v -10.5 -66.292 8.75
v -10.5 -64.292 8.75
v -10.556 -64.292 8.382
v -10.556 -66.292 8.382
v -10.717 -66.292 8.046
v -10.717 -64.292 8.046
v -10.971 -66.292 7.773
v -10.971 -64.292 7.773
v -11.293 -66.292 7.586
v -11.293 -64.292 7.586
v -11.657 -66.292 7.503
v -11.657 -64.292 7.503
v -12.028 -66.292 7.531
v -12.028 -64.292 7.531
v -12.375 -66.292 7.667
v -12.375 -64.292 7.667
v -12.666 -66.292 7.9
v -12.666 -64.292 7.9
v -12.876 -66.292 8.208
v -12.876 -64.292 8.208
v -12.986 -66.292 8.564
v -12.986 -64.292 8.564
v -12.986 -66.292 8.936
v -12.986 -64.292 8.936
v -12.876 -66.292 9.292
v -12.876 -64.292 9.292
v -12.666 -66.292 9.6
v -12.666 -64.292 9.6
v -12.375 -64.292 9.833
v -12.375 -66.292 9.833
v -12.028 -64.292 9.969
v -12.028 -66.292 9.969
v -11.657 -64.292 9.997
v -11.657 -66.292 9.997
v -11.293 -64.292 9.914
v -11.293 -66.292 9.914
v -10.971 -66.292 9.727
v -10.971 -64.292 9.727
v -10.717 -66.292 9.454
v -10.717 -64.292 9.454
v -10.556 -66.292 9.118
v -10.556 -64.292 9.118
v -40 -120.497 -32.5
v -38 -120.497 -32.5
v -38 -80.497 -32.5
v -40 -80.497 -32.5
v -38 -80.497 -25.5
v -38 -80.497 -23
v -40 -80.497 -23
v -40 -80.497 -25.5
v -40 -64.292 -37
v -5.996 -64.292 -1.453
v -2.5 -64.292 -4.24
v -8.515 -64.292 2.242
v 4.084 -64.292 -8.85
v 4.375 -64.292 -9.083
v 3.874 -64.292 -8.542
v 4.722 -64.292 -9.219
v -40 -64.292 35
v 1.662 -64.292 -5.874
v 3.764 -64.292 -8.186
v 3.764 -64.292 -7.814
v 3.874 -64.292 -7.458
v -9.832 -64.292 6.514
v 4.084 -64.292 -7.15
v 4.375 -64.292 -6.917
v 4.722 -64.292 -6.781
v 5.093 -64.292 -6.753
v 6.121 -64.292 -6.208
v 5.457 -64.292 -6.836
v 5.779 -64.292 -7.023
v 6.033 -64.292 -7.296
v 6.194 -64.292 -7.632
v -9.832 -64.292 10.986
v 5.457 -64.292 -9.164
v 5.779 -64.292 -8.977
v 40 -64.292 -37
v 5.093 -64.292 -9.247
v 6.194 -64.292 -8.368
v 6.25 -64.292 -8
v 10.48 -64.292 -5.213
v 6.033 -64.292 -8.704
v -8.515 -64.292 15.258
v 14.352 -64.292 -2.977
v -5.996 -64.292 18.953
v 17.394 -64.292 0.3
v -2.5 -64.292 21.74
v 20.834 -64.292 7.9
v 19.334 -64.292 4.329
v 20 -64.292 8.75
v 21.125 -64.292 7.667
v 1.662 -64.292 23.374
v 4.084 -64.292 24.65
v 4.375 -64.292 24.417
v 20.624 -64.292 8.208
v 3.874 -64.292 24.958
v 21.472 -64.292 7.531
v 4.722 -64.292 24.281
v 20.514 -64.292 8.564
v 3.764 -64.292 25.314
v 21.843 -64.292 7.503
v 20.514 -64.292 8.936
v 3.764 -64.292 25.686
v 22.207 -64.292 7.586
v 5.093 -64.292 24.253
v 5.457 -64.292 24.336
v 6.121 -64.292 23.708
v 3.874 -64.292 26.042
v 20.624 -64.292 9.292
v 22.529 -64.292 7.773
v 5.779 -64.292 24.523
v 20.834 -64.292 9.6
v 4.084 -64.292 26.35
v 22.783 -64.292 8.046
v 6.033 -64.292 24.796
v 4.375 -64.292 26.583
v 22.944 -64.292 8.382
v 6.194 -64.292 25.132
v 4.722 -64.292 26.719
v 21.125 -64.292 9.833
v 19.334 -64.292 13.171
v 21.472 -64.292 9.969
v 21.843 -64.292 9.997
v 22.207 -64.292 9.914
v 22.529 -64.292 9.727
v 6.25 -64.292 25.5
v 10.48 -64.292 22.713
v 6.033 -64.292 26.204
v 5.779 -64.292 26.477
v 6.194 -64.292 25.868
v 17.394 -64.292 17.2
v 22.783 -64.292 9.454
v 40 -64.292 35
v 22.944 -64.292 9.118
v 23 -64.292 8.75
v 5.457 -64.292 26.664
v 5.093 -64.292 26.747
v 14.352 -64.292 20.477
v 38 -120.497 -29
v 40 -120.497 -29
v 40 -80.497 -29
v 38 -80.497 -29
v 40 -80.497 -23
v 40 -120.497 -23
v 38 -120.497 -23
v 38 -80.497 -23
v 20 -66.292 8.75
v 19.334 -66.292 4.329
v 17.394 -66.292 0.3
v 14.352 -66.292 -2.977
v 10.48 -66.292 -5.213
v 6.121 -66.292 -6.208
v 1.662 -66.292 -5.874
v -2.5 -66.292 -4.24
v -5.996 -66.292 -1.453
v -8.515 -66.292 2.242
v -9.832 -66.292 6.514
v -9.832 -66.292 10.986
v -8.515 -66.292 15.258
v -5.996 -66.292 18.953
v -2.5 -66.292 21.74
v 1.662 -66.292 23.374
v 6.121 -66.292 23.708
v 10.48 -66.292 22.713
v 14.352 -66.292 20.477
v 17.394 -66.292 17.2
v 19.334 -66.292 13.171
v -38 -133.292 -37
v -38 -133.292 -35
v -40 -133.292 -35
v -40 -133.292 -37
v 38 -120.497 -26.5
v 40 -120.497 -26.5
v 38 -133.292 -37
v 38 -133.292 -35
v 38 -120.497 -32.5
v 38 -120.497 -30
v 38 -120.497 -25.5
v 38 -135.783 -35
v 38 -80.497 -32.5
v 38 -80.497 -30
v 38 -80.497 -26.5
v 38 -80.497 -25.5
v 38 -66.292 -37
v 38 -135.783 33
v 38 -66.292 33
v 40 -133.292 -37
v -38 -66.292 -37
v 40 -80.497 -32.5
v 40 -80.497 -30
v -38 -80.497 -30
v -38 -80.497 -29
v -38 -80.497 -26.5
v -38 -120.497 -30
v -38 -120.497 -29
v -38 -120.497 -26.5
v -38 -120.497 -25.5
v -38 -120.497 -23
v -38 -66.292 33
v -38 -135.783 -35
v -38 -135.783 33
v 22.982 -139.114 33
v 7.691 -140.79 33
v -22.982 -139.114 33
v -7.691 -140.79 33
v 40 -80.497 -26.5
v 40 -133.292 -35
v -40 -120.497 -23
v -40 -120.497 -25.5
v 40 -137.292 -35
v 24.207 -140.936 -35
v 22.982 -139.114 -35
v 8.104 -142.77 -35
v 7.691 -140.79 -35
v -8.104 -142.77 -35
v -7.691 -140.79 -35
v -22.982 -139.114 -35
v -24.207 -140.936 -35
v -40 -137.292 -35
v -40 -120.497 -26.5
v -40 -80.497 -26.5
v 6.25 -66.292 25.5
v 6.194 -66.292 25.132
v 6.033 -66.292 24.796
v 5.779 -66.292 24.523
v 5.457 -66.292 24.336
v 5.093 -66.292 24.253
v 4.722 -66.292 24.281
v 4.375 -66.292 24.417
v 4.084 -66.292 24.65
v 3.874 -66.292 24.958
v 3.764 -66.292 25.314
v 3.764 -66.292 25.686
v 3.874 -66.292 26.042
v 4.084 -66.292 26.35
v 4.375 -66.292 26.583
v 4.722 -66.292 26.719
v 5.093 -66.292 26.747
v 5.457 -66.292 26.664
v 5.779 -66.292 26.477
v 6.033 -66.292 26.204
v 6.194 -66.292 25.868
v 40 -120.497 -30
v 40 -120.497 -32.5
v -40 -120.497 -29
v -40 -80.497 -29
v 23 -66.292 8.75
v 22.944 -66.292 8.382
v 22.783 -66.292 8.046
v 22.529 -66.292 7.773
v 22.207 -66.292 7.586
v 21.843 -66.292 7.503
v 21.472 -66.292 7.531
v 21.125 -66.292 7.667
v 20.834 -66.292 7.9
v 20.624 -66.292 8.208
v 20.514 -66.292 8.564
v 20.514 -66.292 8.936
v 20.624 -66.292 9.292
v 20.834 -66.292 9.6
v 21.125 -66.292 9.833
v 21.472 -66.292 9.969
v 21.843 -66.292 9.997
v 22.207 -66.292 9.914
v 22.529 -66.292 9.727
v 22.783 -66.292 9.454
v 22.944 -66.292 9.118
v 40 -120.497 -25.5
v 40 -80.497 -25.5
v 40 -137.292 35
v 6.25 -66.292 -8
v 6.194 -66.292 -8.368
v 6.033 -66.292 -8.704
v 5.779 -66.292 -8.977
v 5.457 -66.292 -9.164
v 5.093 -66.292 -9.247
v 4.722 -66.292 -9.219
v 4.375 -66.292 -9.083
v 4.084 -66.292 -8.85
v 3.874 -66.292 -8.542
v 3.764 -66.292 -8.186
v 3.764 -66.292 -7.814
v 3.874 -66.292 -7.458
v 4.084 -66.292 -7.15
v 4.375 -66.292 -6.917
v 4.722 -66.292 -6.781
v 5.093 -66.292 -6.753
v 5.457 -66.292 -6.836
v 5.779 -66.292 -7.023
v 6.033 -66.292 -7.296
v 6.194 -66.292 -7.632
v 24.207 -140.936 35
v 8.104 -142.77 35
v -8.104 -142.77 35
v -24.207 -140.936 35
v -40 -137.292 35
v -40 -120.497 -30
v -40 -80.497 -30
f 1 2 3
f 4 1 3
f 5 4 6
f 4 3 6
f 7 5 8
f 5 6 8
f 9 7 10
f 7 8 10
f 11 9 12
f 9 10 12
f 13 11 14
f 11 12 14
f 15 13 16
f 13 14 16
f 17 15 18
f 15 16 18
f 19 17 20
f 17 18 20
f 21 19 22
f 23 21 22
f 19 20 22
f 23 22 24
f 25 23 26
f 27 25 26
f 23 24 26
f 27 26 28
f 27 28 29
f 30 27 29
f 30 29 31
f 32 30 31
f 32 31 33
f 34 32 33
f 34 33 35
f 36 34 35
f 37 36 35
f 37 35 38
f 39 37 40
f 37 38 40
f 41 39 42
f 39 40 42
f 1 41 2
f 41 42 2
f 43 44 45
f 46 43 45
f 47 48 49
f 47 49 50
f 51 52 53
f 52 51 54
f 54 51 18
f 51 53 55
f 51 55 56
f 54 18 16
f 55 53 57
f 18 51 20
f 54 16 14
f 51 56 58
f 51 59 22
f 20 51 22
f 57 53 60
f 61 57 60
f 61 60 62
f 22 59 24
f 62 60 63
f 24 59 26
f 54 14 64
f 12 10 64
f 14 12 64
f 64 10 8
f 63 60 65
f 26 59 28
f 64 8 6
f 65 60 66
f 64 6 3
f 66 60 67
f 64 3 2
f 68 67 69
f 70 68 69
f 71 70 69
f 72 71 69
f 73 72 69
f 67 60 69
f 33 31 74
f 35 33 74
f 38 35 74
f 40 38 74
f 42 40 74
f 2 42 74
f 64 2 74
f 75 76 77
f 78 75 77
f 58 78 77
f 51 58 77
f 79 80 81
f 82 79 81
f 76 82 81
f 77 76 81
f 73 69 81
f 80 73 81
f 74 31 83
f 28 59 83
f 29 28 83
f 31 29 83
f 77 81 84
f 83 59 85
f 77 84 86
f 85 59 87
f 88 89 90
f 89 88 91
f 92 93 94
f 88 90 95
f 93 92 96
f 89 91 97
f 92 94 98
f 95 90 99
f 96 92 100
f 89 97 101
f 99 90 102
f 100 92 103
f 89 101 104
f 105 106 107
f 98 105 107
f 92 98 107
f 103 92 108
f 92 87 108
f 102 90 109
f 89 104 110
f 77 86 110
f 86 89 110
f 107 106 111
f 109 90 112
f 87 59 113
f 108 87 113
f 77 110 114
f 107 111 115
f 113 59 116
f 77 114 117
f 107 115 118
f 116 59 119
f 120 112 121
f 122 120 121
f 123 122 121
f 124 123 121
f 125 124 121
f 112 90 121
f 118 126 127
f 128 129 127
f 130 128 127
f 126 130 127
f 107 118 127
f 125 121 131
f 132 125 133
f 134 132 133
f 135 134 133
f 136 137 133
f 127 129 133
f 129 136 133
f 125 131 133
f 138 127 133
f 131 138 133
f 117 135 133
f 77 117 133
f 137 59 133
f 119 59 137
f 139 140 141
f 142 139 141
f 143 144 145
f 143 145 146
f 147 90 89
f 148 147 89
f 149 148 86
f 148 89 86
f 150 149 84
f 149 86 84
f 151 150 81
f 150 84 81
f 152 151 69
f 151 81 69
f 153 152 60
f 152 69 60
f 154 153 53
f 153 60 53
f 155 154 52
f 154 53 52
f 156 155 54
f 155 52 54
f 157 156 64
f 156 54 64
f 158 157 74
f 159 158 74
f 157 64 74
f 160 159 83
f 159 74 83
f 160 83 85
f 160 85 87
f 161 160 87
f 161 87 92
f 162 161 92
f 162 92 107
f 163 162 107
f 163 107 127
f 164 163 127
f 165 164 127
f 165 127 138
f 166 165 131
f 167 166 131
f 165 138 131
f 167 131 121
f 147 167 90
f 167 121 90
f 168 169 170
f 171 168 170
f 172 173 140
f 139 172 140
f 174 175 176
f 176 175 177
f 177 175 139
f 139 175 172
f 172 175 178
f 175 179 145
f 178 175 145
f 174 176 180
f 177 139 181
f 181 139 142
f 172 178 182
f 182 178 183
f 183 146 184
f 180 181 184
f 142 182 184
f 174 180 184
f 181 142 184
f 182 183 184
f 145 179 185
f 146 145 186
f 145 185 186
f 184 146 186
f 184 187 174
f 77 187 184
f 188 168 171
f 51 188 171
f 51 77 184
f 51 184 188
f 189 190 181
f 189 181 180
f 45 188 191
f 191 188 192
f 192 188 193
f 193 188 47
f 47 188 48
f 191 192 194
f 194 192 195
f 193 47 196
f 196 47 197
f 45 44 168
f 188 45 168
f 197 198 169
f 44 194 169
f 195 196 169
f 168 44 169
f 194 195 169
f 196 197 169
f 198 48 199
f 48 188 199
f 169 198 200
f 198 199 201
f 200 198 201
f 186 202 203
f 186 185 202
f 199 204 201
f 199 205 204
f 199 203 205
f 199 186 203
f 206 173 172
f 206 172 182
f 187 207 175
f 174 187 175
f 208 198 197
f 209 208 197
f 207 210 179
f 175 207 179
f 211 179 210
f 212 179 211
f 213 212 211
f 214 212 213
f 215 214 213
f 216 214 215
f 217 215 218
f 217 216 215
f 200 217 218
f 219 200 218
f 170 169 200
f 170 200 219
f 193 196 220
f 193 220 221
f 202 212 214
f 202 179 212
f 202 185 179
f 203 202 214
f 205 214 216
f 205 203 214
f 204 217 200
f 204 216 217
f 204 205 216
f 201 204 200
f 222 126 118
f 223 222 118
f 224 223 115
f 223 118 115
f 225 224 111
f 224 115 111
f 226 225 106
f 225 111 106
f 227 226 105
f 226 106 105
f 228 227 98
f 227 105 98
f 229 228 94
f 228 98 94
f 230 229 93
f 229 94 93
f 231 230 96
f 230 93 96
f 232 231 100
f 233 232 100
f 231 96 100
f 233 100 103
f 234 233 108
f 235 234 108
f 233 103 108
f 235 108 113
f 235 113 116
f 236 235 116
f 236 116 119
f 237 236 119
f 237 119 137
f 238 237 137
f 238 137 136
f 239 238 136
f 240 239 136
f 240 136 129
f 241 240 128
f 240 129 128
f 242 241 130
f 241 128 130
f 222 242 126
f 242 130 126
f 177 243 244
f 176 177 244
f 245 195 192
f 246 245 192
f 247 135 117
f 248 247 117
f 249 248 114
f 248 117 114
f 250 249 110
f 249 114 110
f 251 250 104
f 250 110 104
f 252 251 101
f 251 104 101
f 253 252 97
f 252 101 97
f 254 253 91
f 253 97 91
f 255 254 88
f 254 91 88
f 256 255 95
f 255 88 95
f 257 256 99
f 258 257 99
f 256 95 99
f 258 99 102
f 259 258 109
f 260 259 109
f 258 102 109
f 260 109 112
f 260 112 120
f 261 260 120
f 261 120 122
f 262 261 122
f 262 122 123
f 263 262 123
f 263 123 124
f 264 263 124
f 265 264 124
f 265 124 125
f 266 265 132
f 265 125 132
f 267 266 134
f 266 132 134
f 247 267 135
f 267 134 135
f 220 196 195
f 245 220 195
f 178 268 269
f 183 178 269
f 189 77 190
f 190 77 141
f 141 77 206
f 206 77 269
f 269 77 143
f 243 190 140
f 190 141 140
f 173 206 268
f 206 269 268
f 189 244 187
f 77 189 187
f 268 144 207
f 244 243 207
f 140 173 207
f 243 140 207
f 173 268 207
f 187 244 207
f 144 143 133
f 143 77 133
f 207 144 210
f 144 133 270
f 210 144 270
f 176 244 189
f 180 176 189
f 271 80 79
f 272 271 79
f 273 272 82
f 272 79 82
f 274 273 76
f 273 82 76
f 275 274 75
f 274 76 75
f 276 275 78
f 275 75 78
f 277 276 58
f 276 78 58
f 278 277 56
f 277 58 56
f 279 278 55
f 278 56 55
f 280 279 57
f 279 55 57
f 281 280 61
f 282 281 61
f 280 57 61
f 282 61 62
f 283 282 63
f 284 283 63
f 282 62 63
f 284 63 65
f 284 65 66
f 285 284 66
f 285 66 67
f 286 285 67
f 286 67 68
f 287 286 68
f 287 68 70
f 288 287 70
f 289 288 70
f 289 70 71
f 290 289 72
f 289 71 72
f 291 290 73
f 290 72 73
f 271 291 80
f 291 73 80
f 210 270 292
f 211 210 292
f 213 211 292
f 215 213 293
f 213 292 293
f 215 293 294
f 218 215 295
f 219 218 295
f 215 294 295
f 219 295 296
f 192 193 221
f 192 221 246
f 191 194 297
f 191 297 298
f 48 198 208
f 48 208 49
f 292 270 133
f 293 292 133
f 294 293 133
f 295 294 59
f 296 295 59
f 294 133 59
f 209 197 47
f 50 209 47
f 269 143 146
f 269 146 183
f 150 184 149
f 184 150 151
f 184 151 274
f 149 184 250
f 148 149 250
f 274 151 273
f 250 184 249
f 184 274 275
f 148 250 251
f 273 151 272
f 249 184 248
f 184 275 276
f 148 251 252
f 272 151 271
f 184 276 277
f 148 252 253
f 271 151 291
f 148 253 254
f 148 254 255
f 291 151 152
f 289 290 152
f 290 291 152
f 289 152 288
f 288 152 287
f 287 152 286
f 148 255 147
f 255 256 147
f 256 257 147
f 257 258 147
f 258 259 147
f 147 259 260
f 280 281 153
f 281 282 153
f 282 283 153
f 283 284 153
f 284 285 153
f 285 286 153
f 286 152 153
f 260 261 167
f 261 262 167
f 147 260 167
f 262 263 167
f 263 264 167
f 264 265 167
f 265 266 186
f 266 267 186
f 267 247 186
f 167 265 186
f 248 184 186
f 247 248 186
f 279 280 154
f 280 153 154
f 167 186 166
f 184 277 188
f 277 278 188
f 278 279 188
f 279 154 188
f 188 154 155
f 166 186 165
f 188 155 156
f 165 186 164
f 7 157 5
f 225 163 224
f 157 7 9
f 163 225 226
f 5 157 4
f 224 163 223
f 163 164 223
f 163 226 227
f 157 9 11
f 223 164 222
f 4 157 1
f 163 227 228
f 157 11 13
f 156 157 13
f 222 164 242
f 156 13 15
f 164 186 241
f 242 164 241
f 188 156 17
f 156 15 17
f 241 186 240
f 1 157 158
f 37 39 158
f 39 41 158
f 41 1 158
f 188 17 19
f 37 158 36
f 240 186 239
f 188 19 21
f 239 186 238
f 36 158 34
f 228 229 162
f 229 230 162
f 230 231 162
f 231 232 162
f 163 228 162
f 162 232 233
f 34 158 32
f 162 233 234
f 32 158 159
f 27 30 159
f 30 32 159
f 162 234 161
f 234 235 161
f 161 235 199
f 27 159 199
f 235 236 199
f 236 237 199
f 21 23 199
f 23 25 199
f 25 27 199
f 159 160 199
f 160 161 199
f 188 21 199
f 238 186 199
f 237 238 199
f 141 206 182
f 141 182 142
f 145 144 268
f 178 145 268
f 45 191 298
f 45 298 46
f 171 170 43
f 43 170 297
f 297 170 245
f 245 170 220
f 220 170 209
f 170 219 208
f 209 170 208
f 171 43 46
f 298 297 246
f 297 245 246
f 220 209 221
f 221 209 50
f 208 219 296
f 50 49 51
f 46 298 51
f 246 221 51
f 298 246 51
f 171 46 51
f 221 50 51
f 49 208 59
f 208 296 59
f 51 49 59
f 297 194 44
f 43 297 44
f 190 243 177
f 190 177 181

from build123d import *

# Parameters (mm, degrees)
BOSS_EXTRUDE1_DEPTH     = 35
SHELL1_T                = -2
SKETCH3_R               = 15
SKETCH3_R_2             = 1.25
CUT_EXTRUDE2_DEPTH      = 2
SKETCH4_W               = 2.5
SKETCH4_H               = 40
CUT_EXTRUDE3_DEPTH      = 1
CUT_EXTRUDE3_DEPTH_BACK = 81
BOSS_EXTRUDE2_DEPTH     = 2


with BuildPart() as part:
    # Sketch1 → Boss-Extrude1 (new body, symmetric)
    with BuildSketch(Plane.XY):
        with BuildLine():
            Line((-40, -137.291660344), (-40, -64.291660344))
            Line((-40, -64.291660344), (40, -64.291660344))
            Line((40, -64.291660344), (40, -137.291660344))
            ThreePointArc((40, -137.291660344), (0, -143), (-40, -137.291660344))
        make_face()
    extrude(amount=BOSS_EXTRUDE1_DEPTH, both=True)

    # Shell1
    shell1_openings = [part.faces().sort_by_distance(p)[0] for p in [
        (0, -102.218745258, -35),
    ]]
    offset(amount=SHELL1_T, openings=shell1_openings, kind=Kind.INTERSECTION)

    # Sketch3 → Cut-Extrude2 (cut)
    with BuildSketch(Plane(origin=(0, -64.291660344, 0), x_dir=(1, 0, 0), z_dir=(0, 1, 0))):
        with Locations((5, -8.75)):
            Circle(SKETCH3_R)
        with Locations((5, 8)):
            Circle(SKETCH3_R_2)
        with Locations((21.75, -8.75)):
            Circle(SKETCH3_R_2)
        with Locations((-11.75, -8.75)):
            Circle(SKETCH3_R_2)
        with Locations((5, -25.5)):
            Circle(SKETCH3_R_2)
    extrude(amount=-CUT_EXTRUDE2_DEPTH, mode=Mode.SUBTRACT)

    # Sketch4 → Cut-Extrude3 (cut, two sides)
    with BuildSketch(Plane(origin=(40, 0, 0), x_dir=(0, 0, -1), z_dir=(1, 0, 0))) as cut_extrude3_sk:
        with Locations((24.25, -100.496660344)):
            Rectangle(SKETCH4_W, SKETCH4_H)
        with Locations((27.75, -100.496660344)):
            Rectangle(SKETCH4_W, SKETCH4_H)
        with Locations((31.25, -100.496660344)):
            Rectangle(SKETCH4_W, SKETCH4_H)
    extrude(amount=CUT_EXTRUDE3_DEPTH, mode=Mode.SUBTRACT)
    extrude(cut_extrude3_sk.sketch, amount=-CUT_EXTRUDE3_DEPTH_BACK, mode=Mode.SUBTRACT)

    # Sketch6 → Boss-Extrude2 (add)
    with BuildSketch(Plane(origin=(0, 0, -35), x_dir=(-1, 0, 0), z_dir=(0, 0, -1))):
        Polygon((-40, -64.291660344), (-40, -133.291660344), (-38, -133.291660344), (-38, -66.291660344), (38, -66.291660344), (38, -133.291660344), (40, -133.291660344), (40, -64.291660344), align=None)
    extrude(amount=BOSS_EXTRUDE2_DEPTH)


solid = part.part
